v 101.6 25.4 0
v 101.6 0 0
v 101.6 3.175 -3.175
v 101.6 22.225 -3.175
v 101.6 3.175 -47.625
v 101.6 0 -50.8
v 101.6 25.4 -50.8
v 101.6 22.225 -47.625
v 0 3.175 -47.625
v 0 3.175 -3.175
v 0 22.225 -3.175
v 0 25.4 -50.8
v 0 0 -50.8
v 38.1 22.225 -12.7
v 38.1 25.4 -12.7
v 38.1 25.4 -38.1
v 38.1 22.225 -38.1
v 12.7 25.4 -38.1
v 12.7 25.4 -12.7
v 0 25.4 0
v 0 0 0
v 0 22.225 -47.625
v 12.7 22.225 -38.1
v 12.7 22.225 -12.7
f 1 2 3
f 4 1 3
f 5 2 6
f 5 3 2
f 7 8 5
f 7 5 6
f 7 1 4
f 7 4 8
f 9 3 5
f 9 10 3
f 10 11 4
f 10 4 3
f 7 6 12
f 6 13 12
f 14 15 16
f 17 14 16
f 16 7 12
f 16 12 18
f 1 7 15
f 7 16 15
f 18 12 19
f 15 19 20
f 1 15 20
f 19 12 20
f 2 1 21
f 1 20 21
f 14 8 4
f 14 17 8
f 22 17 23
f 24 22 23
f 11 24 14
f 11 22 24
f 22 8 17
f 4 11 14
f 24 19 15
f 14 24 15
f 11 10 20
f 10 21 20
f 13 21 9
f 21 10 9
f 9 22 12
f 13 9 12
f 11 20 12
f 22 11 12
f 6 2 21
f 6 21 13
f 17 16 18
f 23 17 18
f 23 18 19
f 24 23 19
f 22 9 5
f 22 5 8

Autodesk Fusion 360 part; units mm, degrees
sketch "Sketch1" plane through (0, 0, 0) normal (1, 0, 0) x (0, 0, -1)
  line L0 (0, 0) -> (50.8, 0)
  line L1 (50.8, 0) -> (50.8, 25.4)
  line L2 (50.8, 25.4) -> (0, 25.4)
  line L3 (0, 25.4) -> (0, 0)
  line L4 (3.175, 3.175) -> (47.625, 3.175)
  line L5 (47.625, 3.175) -> (47.625, 22.225)
  line L6 (47.625, 22.225) -> (3.175, 22.225)
  line L7 (3.175, 22.225) -> (3.175, 3.175)
  dimension "d1" = 50.8
  dimension "d2" = 25.4
  dimension "d3" = -3.175
extrude "Extrude1" add sketch "Sketch1" along normal blind 101.6
sketch "Sketch2" plane through (0, 25.4, 0) normal (0, 1, 0) x (-1, 0, 0)
  line L0 (0, -50.8) -> (0, 0)
  line L1 (0, 0) -> (-101.6, 0)
  line L2 (-101.6, 0) -> (-101.6, -50.8)
  line L3 (-101.6, -50.8) -> (0, -50.8)
  line L4 (-12.7, -12.7) -> (-38.1, -12.7)
  line L5 (-38.1, -12.7) -> (-38.1, -38.1)
  line L6 (-38.1, -38.1) -> (-12.7, -38.1)
  line L7 (-12.7, -38.1) -> (-12.7, -12.7)
  dimension "d6" = 25.4
  dimension "d7" = 25.4
  dimension "d8" = 12.7
  dimension "d11" = 12.7
extrude "Extrude2" cut sketch "Sketch2" against normal blind 3.175 contours L4 L5 L6 L7
